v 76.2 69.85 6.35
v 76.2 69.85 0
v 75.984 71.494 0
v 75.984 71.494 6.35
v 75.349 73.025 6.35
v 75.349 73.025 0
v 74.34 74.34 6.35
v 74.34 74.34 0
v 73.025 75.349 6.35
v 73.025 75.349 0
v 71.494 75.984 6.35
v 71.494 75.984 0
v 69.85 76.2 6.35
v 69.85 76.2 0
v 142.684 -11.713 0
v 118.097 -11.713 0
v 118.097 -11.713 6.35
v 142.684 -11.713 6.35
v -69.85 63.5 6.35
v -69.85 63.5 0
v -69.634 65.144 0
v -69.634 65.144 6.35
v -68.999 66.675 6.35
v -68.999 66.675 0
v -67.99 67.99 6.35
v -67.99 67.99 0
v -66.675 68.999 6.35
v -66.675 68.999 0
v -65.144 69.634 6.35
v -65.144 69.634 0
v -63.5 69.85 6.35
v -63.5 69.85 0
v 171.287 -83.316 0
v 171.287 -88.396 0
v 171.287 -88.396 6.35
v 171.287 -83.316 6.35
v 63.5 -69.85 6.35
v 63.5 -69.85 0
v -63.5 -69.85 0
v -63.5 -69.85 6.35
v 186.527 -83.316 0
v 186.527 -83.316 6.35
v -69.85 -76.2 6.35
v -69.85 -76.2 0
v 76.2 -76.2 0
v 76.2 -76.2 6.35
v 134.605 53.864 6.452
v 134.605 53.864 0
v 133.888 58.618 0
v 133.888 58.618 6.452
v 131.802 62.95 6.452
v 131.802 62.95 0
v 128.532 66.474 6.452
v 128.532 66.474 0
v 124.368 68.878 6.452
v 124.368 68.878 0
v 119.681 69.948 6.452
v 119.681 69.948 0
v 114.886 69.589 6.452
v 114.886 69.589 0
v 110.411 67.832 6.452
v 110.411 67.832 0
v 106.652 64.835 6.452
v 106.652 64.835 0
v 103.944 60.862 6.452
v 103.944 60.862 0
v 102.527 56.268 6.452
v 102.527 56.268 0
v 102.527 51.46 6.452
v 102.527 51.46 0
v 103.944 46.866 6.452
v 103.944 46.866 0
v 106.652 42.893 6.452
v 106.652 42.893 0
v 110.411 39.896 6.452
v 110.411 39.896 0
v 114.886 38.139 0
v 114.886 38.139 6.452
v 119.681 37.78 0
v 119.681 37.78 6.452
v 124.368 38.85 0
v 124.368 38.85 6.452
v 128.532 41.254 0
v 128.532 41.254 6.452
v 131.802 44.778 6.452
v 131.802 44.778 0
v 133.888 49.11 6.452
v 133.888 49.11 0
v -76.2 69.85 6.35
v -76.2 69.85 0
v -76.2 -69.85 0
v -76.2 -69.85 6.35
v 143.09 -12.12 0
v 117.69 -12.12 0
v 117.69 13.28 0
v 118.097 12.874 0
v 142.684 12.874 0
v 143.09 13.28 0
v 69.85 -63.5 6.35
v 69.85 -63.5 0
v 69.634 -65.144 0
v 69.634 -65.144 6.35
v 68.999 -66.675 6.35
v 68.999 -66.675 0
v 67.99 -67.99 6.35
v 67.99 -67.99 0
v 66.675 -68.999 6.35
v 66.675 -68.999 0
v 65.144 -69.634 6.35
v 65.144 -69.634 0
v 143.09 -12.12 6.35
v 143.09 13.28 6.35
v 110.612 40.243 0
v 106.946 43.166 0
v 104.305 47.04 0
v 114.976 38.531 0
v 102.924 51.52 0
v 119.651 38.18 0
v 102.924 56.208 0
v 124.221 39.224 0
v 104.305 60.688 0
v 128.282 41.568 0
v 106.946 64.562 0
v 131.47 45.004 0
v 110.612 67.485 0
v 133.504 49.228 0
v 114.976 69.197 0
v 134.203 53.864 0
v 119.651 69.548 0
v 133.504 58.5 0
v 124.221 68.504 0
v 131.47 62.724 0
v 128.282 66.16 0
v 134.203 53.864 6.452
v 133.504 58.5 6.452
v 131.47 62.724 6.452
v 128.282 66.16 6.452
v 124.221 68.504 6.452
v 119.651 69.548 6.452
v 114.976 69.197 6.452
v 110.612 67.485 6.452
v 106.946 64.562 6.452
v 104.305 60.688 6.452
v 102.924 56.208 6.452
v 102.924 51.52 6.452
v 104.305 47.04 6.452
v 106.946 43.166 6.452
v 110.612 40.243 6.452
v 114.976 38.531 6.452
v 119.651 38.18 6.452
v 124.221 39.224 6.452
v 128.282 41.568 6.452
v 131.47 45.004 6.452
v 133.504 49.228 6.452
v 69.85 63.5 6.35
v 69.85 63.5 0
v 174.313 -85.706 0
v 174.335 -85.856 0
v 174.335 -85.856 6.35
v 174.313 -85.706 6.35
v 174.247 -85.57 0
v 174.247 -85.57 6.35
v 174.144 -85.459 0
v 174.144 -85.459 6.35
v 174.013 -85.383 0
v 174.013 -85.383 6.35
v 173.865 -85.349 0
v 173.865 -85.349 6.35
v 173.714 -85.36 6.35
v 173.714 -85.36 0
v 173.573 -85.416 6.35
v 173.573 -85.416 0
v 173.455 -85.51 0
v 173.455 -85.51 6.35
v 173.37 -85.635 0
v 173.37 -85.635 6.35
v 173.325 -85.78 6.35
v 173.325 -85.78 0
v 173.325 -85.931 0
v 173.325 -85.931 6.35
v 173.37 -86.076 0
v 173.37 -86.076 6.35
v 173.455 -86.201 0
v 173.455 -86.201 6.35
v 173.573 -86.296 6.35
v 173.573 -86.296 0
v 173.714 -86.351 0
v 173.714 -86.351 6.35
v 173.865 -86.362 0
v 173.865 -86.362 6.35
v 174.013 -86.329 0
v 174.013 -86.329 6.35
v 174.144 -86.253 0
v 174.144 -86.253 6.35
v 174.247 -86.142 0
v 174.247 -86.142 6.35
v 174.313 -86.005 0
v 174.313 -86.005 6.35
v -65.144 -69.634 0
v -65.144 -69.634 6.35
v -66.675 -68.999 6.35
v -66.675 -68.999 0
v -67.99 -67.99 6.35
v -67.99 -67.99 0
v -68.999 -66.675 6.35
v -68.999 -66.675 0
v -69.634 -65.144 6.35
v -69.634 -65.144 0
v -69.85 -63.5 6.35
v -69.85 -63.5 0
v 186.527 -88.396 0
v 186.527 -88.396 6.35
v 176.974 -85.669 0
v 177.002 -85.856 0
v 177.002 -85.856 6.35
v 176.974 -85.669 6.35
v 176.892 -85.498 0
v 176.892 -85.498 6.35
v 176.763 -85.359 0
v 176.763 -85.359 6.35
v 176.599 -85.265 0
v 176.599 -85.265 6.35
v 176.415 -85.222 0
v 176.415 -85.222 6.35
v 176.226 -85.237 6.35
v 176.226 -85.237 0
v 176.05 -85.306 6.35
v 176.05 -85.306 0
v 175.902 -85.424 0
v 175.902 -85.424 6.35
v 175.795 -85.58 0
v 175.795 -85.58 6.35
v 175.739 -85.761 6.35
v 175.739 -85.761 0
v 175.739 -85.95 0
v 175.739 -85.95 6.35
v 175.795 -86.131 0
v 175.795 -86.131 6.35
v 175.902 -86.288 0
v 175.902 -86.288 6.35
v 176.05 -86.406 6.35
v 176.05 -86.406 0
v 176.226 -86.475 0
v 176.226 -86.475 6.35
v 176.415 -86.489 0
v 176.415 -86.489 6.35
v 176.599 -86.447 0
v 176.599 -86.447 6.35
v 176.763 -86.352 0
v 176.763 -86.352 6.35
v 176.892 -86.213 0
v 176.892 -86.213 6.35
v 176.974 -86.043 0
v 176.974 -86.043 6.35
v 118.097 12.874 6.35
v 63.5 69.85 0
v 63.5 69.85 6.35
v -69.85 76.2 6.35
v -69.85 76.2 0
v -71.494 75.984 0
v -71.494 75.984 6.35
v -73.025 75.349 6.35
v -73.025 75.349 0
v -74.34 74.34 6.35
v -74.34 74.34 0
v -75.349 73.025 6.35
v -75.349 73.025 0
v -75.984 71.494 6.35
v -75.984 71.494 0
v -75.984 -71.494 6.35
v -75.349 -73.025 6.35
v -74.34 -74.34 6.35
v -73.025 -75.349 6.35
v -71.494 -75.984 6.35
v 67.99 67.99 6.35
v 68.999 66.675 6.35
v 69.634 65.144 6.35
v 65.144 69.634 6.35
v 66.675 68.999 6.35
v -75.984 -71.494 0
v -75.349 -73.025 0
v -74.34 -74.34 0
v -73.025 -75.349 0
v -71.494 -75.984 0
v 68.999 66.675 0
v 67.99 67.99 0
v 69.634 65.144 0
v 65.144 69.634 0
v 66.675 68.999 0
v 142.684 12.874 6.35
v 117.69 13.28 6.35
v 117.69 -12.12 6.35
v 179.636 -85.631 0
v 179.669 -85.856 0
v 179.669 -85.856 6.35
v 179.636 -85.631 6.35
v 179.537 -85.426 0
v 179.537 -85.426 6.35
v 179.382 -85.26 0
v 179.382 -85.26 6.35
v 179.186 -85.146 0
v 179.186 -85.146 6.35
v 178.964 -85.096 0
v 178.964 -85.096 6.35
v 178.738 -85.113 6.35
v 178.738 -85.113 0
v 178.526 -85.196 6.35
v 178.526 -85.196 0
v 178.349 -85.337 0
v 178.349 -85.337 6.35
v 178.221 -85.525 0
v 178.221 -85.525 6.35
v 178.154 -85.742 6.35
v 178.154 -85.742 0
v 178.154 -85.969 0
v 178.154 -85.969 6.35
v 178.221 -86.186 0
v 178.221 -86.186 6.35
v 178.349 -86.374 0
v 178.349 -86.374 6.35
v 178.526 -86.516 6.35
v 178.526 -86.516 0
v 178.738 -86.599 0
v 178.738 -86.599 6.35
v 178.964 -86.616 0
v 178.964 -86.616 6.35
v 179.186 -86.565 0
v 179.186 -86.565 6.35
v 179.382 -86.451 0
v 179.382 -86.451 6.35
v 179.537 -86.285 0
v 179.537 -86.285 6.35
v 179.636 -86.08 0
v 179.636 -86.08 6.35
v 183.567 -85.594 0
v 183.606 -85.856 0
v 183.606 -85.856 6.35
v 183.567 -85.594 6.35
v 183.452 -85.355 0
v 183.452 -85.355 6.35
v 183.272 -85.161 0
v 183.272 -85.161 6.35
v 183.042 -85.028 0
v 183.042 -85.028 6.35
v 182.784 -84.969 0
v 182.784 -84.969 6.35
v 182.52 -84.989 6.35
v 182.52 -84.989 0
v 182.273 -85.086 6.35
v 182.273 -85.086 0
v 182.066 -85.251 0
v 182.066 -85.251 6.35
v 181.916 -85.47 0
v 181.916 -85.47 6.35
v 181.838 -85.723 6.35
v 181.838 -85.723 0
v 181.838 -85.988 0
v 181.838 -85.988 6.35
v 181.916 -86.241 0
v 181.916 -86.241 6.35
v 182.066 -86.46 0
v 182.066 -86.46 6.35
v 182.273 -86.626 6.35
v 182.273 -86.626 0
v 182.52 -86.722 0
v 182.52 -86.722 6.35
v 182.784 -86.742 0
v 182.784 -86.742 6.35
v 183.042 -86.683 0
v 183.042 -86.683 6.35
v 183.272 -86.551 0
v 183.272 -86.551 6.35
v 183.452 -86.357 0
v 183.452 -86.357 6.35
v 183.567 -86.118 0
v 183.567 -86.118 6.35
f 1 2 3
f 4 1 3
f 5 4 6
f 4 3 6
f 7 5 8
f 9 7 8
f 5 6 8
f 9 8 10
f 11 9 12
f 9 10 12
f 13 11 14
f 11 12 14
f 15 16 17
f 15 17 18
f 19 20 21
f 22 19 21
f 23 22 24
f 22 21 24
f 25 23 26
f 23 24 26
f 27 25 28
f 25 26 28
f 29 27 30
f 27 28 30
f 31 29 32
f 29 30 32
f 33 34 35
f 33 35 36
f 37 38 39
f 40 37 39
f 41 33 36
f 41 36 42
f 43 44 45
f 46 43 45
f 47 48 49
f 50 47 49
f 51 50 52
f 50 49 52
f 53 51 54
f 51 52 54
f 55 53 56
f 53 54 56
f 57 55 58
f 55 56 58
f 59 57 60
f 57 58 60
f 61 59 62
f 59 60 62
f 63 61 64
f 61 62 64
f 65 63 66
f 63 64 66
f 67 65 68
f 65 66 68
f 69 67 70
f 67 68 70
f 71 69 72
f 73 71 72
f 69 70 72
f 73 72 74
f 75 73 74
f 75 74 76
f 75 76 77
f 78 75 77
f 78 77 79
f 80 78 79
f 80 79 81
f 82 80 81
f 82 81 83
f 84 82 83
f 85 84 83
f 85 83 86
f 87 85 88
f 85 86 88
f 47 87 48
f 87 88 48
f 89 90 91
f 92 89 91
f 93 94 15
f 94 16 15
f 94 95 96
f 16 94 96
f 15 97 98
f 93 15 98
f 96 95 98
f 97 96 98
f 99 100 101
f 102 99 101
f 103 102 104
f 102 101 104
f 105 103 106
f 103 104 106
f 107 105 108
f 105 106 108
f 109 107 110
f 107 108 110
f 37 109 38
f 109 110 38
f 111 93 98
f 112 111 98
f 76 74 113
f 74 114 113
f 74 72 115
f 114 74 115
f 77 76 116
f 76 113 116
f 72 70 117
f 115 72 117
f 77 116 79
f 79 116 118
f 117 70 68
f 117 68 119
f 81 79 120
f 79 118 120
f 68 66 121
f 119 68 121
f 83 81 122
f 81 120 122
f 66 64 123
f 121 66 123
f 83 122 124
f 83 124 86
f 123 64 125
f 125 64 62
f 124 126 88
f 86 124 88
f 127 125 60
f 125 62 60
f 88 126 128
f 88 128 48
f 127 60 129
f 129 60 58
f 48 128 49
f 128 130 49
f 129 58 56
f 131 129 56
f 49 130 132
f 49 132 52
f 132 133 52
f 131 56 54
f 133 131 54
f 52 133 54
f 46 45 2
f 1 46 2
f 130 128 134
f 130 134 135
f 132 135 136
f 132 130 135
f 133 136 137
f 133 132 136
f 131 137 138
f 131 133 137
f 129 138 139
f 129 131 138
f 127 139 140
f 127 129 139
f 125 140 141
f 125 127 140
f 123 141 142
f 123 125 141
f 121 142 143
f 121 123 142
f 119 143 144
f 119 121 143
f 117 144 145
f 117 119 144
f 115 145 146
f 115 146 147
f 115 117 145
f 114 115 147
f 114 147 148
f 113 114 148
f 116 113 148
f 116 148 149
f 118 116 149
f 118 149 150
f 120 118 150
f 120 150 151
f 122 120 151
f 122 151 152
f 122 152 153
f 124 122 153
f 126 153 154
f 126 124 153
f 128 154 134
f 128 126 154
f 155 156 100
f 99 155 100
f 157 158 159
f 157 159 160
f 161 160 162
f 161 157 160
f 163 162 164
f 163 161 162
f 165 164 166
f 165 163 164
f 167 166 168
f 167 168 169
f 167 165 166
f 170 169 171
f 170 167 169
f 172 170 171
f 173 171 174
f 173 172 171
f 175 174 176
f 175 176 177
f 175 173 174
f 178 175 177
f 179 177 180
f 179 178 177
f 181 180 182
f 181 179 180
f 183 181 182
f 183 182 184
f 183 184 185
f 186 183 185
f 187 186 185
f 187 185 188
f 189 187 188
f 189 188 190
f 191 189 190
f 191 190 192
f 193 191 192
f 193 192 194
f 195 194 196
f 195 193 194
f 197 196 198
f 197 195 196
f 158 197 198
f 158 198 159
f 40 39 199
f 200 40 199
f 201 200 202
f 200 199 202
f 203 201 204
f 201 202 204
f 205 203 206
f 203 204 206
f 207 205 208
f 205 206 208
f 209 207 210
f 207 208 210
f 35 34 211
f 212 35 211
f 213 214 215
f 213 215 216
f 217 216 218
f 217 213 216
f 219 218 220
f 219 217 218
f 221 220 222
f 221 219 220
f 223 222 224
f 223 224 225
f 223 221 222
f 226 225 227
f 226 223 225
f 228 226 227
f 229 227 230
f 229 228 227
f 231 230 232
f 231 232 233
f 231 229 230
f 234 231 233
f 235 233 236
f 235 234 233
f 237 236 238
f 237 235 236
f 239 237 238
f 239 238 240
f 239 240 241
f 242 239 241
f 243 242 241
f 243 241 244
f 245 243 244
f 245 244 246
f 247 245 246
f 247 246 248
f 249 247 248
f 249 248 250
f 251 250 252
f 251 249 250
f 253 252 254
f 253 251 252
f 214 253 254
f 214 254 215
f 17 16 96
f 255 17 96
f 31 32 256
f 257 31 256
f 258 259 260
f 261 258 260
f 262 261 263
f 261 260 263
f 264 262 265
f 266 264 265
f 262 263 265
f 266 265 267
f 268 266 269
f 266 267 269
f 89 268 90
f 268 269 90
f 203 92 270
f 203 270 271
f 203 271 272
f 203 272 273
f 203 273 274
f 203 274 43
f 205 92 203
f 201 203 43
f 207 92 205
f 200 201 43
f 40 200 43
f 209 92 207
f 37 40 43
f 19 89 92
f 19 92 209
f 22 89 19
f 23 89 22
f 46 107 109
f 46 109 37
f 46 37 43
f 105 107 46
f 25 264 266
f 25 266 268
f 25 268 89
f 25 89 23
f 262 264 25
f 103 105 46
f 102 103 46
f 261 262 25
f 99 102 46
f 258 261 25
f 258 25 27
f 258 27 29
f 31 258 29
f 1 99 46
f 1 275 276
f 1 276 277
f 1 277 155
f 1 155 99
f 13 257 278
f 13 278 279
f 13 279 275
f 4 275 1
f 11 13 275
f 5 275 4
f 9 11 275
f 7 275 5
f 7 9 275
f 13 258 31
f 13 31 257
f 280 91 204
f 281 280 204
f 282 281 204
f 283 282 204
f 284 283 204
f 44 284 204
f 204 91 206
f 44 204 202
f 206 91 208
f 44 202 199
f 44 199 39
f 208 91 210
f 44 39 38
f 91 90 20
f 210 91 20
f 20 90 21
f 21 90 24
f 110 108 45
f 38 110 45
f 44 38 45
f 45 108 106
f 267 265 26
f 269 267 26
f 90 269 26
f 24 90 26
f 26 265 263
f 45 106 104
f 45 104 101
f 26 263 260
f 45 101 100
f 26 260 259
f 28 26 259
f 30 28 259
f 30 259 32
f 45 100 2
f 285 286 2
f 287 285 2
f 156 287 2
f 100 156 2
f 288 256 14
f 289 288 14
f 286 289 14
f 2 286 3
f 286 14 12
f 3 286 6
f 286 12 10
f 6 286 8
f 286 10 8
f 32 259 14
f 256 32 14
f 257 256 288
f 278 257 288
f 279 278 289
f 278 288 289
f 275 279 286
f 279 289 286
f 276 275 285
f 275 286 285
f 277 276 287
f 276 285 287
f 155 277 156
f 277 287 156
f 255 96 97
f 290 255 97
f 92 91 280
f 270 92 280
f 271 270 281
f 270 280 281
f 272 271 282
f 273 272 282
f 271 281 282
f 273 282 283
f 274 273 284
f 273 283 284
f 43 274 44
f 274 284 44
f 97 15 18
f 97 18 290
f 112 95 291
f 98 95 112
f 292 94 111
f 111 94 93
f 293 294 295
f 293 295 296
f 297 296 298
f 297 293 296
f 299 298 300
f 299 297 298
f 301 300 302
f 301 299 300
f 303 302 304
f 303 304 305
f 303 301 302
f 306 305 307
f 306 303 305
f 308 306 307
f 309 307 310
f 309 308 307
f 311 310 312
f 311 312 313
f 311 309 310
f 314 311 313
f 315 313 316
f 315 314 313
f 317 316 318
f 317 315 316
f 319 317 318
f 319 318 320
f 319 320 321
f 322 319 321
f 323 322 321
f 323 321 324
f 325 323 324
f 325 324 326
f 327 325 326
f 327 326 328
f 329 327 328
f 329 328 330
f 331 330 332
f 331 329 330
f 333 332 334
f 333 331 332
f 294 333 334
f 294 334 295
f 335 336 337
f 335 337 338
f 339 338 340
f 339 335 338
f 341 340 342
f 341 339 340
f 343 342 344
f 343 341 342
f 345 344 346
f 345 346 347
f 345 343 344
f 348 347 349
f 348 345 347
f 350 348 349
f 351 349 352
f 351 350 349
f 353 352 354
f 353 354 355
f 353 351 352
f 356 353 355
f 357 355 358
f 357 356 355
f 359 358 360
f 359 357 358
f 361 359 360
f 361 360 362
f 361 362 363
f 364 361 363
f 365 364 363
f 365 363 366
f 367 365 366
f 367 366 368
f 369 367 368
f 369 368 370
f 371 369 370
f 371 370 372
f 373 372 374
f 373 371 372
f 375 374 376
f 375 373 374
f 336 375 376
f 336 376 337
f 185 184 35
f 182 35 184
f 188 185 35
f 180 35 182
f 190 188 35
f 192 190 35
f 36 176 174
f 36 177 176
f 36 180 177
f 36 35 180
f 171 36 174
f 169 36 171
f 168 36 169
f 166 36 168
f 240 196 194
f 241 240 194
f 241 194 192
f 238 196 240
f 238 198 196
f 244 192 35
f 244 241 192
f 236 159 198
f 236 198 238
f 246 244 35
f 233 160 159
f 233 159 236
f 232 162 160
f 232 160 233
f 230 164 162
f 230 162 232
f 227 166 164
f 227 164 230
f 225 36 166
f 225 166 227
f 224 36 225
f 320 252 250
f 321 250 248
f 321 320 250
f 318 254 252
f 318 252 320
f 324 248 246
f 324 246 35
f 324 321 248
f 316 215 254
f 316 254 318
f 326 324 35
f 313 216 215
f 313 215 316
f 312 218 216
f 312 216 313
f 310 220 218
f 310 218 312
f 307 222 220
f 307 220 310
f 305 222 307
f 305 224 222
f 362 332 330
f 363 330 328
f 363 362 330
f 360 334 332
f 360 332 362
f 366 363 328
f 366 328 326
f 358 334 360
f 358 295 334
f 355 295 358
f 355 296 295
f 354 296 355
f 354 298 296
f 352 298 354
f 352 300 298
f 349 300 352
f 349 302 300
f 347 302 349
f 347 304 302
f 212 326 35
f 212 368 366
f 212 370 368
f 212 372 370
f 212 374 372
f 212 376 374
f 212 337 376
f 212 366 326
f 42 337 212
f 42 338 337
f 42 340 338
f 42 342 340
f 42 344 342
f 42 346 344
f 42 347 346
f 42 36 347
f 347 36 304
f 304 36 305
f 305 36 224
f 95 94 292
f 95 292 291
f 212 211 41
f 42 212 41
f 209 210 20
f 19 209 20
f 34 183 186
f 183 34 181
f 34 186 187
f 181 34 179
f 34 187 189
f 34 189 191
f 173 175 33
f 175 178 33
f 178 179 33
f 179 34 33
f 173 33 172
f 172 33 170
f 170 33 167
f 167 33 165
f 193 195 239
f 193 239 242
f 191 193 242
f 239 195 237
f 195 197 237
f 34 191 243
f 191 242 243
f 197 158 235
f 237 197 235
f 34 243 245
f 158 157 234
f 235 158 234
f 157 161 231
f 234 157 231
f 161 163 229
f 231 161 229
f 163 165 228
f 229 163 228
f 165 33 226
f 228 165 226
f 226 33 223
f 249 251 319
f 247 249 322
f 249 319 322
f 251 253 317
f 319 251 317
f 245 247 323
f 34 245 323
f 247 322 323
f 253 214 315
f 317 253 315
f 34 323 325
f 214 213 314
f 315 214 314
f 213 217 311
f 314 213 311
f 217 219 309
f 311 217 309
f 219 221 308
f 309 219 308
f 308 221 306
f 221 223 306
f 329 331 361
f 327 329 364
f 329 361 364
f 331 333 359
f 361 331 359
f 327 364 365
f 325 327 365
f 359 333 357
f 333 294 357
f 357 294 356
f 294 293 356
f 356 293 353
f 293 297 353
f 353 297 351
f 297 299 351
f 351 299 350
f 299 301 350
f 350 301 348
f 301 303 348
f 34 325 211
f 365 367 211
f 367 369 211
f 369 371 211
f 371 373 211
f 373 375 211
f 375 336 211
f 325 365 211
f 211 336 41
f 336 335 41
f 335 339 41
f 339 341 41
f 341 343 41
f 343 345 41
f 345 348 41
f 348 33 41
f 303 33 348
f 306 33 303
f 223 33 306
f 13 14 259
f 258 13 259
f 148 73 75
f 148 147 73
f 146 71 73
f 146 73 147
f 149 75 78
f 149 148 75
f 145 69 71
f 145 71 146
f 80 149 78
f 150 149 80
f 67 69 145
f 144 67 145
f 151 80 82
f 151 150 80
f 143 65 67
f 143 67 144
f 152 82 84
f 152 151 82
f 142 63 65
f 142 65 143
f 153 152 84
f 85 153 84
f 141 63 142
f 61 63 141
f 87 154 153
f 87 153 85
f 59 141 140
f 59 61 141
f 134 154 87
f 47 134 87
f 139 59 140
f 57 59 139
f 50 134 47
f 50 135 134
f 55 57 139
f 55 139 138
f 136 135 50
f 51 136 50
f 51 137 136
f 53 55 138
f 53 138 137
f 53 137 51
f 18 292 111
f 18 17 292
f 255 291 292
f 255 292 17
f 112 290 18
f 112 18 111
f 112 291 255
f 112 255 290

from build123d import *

# Parameters (mm, degrees)
F1_DEPTH = 6.35
F0_W     = 25.4
F0_H     = 25.4
F0_W_2   = 24.5872
F0_H_2   = 24.5872
F2_DEPTH = 6.35
F0_R     = 16.129
F0_R_2   = 15.72768
F3_DEPTH = 6.4516
F0_W_3   = 15.24
F0_H_3   = 5.08
F0_R_3   = 0.508
F0_R_4   = 0.635
F0_R_5   = 0.762
F0_R_6   = 0.889
F4_DEPTH = 6.35


with BuildPart() as f1:
    # F0 (on Top) → F1 (new body)
    with BuildSketch(Plane.XY):
        with BuildLine():
            Line((69.85, 76.2), (-69.85, 76.2))
            ThreePointArc((-69.85, 76.2), (-74.340128, 74.340128), (-76.2, 69.85))
            Line((-76.2, 69.85), (-76.2, -69.85))
            ThreePointArc((-76.2, -69.85), (-74.340128, -74.340128), (-69.85, -76.2))
            Line((-69.85, -76.2), (76.2, -76.2))
            Line((76.2, -76.2), (76.2, 69.85))
            ThreePointArc((76.2, 69.85), (74.340128, 74.340128), (69.85, 76.2))
        make_face()
        with BuildLine():
            ThreePointArc((-69.85, 63.5), (-67.990128, 67.990128), (-63.5, 69.85))
            Line((-63.5, 69.85), (63.5, 69.85))
            ThreePointArc((63.5, 69.85), (67.990128, 67.990128), (69.85, 63.5))
            Line((69.85, 63.5), (69.85, -63.5))
            ThreePointArc((69.85, -63.5), (67.990128, -67.990128), (63.5, -69.85))
            Line((63.5, -69.85), (-63.5, -69.85))
            ThreePointArc((-63.5, -69.85), (-67.990128, -67.990128), (-69.85, -63.5))
            Line((-69.85, -63.5), (-69.85, 63.5))
        make_face(mode=Mode.SUBTRACT)
    extrude(amount=F1_DEPTH)


with BuildPart() as f2:
    # F0 (on Top) → F2 (new body)
    with BuildSketch(Plane.XY):
        with Locations((130.390407, 0.580179)):
            Rectangle(F0_W, F0_H)
        with Locations((130.390407, 0.580179)):
            Rectangle(F0_W_2, F0_H_2, mode=Mode.SUBTRACT)
    extrude(amount=F2_DEPTH)


with BuildPart() as f3:
    # F0 (on Top) → F3 (new body)
    with BuildSketch(Plane.XY):
        with Locations((118.475519, 53.864006)):
            Circle(F0_R)
        with Locations((118.475519, 53.864006)):
            Circle(F0_R_2, mode=Mode.SUBTRACT)
    extrude(amount=F3_DEPTH)


with BuildPart() as f4:
    # F0 (on Top) → F4 (new body)
    with BuildSketch(Plane.XY):
        with Locations((178.907368, -85.855722)):
            Rectangle(F0_W_3, F0_H_3)
        with Locations((173.827368, -85.855722)):
            Circle(F0_R_3, mode=Mode.SUBTRACT)
        with Locations((176.367368, -85.855722)):
            Circle(F0_R_4, mode=Mode.SUBTRACT)
        with Locations((178.907368, -85.855722)):
            Circle(F0_R_5, mode=Mode.SUBTRACT)
        with Locations((182.717368, -85.855722)):
            Circle(F0_R_6, mode=Mode.SUBTRACT)
    extrude(amount=F4_DEPTH)


solid = Compound([f1.part, f2.part, f3.part, f4.part])
